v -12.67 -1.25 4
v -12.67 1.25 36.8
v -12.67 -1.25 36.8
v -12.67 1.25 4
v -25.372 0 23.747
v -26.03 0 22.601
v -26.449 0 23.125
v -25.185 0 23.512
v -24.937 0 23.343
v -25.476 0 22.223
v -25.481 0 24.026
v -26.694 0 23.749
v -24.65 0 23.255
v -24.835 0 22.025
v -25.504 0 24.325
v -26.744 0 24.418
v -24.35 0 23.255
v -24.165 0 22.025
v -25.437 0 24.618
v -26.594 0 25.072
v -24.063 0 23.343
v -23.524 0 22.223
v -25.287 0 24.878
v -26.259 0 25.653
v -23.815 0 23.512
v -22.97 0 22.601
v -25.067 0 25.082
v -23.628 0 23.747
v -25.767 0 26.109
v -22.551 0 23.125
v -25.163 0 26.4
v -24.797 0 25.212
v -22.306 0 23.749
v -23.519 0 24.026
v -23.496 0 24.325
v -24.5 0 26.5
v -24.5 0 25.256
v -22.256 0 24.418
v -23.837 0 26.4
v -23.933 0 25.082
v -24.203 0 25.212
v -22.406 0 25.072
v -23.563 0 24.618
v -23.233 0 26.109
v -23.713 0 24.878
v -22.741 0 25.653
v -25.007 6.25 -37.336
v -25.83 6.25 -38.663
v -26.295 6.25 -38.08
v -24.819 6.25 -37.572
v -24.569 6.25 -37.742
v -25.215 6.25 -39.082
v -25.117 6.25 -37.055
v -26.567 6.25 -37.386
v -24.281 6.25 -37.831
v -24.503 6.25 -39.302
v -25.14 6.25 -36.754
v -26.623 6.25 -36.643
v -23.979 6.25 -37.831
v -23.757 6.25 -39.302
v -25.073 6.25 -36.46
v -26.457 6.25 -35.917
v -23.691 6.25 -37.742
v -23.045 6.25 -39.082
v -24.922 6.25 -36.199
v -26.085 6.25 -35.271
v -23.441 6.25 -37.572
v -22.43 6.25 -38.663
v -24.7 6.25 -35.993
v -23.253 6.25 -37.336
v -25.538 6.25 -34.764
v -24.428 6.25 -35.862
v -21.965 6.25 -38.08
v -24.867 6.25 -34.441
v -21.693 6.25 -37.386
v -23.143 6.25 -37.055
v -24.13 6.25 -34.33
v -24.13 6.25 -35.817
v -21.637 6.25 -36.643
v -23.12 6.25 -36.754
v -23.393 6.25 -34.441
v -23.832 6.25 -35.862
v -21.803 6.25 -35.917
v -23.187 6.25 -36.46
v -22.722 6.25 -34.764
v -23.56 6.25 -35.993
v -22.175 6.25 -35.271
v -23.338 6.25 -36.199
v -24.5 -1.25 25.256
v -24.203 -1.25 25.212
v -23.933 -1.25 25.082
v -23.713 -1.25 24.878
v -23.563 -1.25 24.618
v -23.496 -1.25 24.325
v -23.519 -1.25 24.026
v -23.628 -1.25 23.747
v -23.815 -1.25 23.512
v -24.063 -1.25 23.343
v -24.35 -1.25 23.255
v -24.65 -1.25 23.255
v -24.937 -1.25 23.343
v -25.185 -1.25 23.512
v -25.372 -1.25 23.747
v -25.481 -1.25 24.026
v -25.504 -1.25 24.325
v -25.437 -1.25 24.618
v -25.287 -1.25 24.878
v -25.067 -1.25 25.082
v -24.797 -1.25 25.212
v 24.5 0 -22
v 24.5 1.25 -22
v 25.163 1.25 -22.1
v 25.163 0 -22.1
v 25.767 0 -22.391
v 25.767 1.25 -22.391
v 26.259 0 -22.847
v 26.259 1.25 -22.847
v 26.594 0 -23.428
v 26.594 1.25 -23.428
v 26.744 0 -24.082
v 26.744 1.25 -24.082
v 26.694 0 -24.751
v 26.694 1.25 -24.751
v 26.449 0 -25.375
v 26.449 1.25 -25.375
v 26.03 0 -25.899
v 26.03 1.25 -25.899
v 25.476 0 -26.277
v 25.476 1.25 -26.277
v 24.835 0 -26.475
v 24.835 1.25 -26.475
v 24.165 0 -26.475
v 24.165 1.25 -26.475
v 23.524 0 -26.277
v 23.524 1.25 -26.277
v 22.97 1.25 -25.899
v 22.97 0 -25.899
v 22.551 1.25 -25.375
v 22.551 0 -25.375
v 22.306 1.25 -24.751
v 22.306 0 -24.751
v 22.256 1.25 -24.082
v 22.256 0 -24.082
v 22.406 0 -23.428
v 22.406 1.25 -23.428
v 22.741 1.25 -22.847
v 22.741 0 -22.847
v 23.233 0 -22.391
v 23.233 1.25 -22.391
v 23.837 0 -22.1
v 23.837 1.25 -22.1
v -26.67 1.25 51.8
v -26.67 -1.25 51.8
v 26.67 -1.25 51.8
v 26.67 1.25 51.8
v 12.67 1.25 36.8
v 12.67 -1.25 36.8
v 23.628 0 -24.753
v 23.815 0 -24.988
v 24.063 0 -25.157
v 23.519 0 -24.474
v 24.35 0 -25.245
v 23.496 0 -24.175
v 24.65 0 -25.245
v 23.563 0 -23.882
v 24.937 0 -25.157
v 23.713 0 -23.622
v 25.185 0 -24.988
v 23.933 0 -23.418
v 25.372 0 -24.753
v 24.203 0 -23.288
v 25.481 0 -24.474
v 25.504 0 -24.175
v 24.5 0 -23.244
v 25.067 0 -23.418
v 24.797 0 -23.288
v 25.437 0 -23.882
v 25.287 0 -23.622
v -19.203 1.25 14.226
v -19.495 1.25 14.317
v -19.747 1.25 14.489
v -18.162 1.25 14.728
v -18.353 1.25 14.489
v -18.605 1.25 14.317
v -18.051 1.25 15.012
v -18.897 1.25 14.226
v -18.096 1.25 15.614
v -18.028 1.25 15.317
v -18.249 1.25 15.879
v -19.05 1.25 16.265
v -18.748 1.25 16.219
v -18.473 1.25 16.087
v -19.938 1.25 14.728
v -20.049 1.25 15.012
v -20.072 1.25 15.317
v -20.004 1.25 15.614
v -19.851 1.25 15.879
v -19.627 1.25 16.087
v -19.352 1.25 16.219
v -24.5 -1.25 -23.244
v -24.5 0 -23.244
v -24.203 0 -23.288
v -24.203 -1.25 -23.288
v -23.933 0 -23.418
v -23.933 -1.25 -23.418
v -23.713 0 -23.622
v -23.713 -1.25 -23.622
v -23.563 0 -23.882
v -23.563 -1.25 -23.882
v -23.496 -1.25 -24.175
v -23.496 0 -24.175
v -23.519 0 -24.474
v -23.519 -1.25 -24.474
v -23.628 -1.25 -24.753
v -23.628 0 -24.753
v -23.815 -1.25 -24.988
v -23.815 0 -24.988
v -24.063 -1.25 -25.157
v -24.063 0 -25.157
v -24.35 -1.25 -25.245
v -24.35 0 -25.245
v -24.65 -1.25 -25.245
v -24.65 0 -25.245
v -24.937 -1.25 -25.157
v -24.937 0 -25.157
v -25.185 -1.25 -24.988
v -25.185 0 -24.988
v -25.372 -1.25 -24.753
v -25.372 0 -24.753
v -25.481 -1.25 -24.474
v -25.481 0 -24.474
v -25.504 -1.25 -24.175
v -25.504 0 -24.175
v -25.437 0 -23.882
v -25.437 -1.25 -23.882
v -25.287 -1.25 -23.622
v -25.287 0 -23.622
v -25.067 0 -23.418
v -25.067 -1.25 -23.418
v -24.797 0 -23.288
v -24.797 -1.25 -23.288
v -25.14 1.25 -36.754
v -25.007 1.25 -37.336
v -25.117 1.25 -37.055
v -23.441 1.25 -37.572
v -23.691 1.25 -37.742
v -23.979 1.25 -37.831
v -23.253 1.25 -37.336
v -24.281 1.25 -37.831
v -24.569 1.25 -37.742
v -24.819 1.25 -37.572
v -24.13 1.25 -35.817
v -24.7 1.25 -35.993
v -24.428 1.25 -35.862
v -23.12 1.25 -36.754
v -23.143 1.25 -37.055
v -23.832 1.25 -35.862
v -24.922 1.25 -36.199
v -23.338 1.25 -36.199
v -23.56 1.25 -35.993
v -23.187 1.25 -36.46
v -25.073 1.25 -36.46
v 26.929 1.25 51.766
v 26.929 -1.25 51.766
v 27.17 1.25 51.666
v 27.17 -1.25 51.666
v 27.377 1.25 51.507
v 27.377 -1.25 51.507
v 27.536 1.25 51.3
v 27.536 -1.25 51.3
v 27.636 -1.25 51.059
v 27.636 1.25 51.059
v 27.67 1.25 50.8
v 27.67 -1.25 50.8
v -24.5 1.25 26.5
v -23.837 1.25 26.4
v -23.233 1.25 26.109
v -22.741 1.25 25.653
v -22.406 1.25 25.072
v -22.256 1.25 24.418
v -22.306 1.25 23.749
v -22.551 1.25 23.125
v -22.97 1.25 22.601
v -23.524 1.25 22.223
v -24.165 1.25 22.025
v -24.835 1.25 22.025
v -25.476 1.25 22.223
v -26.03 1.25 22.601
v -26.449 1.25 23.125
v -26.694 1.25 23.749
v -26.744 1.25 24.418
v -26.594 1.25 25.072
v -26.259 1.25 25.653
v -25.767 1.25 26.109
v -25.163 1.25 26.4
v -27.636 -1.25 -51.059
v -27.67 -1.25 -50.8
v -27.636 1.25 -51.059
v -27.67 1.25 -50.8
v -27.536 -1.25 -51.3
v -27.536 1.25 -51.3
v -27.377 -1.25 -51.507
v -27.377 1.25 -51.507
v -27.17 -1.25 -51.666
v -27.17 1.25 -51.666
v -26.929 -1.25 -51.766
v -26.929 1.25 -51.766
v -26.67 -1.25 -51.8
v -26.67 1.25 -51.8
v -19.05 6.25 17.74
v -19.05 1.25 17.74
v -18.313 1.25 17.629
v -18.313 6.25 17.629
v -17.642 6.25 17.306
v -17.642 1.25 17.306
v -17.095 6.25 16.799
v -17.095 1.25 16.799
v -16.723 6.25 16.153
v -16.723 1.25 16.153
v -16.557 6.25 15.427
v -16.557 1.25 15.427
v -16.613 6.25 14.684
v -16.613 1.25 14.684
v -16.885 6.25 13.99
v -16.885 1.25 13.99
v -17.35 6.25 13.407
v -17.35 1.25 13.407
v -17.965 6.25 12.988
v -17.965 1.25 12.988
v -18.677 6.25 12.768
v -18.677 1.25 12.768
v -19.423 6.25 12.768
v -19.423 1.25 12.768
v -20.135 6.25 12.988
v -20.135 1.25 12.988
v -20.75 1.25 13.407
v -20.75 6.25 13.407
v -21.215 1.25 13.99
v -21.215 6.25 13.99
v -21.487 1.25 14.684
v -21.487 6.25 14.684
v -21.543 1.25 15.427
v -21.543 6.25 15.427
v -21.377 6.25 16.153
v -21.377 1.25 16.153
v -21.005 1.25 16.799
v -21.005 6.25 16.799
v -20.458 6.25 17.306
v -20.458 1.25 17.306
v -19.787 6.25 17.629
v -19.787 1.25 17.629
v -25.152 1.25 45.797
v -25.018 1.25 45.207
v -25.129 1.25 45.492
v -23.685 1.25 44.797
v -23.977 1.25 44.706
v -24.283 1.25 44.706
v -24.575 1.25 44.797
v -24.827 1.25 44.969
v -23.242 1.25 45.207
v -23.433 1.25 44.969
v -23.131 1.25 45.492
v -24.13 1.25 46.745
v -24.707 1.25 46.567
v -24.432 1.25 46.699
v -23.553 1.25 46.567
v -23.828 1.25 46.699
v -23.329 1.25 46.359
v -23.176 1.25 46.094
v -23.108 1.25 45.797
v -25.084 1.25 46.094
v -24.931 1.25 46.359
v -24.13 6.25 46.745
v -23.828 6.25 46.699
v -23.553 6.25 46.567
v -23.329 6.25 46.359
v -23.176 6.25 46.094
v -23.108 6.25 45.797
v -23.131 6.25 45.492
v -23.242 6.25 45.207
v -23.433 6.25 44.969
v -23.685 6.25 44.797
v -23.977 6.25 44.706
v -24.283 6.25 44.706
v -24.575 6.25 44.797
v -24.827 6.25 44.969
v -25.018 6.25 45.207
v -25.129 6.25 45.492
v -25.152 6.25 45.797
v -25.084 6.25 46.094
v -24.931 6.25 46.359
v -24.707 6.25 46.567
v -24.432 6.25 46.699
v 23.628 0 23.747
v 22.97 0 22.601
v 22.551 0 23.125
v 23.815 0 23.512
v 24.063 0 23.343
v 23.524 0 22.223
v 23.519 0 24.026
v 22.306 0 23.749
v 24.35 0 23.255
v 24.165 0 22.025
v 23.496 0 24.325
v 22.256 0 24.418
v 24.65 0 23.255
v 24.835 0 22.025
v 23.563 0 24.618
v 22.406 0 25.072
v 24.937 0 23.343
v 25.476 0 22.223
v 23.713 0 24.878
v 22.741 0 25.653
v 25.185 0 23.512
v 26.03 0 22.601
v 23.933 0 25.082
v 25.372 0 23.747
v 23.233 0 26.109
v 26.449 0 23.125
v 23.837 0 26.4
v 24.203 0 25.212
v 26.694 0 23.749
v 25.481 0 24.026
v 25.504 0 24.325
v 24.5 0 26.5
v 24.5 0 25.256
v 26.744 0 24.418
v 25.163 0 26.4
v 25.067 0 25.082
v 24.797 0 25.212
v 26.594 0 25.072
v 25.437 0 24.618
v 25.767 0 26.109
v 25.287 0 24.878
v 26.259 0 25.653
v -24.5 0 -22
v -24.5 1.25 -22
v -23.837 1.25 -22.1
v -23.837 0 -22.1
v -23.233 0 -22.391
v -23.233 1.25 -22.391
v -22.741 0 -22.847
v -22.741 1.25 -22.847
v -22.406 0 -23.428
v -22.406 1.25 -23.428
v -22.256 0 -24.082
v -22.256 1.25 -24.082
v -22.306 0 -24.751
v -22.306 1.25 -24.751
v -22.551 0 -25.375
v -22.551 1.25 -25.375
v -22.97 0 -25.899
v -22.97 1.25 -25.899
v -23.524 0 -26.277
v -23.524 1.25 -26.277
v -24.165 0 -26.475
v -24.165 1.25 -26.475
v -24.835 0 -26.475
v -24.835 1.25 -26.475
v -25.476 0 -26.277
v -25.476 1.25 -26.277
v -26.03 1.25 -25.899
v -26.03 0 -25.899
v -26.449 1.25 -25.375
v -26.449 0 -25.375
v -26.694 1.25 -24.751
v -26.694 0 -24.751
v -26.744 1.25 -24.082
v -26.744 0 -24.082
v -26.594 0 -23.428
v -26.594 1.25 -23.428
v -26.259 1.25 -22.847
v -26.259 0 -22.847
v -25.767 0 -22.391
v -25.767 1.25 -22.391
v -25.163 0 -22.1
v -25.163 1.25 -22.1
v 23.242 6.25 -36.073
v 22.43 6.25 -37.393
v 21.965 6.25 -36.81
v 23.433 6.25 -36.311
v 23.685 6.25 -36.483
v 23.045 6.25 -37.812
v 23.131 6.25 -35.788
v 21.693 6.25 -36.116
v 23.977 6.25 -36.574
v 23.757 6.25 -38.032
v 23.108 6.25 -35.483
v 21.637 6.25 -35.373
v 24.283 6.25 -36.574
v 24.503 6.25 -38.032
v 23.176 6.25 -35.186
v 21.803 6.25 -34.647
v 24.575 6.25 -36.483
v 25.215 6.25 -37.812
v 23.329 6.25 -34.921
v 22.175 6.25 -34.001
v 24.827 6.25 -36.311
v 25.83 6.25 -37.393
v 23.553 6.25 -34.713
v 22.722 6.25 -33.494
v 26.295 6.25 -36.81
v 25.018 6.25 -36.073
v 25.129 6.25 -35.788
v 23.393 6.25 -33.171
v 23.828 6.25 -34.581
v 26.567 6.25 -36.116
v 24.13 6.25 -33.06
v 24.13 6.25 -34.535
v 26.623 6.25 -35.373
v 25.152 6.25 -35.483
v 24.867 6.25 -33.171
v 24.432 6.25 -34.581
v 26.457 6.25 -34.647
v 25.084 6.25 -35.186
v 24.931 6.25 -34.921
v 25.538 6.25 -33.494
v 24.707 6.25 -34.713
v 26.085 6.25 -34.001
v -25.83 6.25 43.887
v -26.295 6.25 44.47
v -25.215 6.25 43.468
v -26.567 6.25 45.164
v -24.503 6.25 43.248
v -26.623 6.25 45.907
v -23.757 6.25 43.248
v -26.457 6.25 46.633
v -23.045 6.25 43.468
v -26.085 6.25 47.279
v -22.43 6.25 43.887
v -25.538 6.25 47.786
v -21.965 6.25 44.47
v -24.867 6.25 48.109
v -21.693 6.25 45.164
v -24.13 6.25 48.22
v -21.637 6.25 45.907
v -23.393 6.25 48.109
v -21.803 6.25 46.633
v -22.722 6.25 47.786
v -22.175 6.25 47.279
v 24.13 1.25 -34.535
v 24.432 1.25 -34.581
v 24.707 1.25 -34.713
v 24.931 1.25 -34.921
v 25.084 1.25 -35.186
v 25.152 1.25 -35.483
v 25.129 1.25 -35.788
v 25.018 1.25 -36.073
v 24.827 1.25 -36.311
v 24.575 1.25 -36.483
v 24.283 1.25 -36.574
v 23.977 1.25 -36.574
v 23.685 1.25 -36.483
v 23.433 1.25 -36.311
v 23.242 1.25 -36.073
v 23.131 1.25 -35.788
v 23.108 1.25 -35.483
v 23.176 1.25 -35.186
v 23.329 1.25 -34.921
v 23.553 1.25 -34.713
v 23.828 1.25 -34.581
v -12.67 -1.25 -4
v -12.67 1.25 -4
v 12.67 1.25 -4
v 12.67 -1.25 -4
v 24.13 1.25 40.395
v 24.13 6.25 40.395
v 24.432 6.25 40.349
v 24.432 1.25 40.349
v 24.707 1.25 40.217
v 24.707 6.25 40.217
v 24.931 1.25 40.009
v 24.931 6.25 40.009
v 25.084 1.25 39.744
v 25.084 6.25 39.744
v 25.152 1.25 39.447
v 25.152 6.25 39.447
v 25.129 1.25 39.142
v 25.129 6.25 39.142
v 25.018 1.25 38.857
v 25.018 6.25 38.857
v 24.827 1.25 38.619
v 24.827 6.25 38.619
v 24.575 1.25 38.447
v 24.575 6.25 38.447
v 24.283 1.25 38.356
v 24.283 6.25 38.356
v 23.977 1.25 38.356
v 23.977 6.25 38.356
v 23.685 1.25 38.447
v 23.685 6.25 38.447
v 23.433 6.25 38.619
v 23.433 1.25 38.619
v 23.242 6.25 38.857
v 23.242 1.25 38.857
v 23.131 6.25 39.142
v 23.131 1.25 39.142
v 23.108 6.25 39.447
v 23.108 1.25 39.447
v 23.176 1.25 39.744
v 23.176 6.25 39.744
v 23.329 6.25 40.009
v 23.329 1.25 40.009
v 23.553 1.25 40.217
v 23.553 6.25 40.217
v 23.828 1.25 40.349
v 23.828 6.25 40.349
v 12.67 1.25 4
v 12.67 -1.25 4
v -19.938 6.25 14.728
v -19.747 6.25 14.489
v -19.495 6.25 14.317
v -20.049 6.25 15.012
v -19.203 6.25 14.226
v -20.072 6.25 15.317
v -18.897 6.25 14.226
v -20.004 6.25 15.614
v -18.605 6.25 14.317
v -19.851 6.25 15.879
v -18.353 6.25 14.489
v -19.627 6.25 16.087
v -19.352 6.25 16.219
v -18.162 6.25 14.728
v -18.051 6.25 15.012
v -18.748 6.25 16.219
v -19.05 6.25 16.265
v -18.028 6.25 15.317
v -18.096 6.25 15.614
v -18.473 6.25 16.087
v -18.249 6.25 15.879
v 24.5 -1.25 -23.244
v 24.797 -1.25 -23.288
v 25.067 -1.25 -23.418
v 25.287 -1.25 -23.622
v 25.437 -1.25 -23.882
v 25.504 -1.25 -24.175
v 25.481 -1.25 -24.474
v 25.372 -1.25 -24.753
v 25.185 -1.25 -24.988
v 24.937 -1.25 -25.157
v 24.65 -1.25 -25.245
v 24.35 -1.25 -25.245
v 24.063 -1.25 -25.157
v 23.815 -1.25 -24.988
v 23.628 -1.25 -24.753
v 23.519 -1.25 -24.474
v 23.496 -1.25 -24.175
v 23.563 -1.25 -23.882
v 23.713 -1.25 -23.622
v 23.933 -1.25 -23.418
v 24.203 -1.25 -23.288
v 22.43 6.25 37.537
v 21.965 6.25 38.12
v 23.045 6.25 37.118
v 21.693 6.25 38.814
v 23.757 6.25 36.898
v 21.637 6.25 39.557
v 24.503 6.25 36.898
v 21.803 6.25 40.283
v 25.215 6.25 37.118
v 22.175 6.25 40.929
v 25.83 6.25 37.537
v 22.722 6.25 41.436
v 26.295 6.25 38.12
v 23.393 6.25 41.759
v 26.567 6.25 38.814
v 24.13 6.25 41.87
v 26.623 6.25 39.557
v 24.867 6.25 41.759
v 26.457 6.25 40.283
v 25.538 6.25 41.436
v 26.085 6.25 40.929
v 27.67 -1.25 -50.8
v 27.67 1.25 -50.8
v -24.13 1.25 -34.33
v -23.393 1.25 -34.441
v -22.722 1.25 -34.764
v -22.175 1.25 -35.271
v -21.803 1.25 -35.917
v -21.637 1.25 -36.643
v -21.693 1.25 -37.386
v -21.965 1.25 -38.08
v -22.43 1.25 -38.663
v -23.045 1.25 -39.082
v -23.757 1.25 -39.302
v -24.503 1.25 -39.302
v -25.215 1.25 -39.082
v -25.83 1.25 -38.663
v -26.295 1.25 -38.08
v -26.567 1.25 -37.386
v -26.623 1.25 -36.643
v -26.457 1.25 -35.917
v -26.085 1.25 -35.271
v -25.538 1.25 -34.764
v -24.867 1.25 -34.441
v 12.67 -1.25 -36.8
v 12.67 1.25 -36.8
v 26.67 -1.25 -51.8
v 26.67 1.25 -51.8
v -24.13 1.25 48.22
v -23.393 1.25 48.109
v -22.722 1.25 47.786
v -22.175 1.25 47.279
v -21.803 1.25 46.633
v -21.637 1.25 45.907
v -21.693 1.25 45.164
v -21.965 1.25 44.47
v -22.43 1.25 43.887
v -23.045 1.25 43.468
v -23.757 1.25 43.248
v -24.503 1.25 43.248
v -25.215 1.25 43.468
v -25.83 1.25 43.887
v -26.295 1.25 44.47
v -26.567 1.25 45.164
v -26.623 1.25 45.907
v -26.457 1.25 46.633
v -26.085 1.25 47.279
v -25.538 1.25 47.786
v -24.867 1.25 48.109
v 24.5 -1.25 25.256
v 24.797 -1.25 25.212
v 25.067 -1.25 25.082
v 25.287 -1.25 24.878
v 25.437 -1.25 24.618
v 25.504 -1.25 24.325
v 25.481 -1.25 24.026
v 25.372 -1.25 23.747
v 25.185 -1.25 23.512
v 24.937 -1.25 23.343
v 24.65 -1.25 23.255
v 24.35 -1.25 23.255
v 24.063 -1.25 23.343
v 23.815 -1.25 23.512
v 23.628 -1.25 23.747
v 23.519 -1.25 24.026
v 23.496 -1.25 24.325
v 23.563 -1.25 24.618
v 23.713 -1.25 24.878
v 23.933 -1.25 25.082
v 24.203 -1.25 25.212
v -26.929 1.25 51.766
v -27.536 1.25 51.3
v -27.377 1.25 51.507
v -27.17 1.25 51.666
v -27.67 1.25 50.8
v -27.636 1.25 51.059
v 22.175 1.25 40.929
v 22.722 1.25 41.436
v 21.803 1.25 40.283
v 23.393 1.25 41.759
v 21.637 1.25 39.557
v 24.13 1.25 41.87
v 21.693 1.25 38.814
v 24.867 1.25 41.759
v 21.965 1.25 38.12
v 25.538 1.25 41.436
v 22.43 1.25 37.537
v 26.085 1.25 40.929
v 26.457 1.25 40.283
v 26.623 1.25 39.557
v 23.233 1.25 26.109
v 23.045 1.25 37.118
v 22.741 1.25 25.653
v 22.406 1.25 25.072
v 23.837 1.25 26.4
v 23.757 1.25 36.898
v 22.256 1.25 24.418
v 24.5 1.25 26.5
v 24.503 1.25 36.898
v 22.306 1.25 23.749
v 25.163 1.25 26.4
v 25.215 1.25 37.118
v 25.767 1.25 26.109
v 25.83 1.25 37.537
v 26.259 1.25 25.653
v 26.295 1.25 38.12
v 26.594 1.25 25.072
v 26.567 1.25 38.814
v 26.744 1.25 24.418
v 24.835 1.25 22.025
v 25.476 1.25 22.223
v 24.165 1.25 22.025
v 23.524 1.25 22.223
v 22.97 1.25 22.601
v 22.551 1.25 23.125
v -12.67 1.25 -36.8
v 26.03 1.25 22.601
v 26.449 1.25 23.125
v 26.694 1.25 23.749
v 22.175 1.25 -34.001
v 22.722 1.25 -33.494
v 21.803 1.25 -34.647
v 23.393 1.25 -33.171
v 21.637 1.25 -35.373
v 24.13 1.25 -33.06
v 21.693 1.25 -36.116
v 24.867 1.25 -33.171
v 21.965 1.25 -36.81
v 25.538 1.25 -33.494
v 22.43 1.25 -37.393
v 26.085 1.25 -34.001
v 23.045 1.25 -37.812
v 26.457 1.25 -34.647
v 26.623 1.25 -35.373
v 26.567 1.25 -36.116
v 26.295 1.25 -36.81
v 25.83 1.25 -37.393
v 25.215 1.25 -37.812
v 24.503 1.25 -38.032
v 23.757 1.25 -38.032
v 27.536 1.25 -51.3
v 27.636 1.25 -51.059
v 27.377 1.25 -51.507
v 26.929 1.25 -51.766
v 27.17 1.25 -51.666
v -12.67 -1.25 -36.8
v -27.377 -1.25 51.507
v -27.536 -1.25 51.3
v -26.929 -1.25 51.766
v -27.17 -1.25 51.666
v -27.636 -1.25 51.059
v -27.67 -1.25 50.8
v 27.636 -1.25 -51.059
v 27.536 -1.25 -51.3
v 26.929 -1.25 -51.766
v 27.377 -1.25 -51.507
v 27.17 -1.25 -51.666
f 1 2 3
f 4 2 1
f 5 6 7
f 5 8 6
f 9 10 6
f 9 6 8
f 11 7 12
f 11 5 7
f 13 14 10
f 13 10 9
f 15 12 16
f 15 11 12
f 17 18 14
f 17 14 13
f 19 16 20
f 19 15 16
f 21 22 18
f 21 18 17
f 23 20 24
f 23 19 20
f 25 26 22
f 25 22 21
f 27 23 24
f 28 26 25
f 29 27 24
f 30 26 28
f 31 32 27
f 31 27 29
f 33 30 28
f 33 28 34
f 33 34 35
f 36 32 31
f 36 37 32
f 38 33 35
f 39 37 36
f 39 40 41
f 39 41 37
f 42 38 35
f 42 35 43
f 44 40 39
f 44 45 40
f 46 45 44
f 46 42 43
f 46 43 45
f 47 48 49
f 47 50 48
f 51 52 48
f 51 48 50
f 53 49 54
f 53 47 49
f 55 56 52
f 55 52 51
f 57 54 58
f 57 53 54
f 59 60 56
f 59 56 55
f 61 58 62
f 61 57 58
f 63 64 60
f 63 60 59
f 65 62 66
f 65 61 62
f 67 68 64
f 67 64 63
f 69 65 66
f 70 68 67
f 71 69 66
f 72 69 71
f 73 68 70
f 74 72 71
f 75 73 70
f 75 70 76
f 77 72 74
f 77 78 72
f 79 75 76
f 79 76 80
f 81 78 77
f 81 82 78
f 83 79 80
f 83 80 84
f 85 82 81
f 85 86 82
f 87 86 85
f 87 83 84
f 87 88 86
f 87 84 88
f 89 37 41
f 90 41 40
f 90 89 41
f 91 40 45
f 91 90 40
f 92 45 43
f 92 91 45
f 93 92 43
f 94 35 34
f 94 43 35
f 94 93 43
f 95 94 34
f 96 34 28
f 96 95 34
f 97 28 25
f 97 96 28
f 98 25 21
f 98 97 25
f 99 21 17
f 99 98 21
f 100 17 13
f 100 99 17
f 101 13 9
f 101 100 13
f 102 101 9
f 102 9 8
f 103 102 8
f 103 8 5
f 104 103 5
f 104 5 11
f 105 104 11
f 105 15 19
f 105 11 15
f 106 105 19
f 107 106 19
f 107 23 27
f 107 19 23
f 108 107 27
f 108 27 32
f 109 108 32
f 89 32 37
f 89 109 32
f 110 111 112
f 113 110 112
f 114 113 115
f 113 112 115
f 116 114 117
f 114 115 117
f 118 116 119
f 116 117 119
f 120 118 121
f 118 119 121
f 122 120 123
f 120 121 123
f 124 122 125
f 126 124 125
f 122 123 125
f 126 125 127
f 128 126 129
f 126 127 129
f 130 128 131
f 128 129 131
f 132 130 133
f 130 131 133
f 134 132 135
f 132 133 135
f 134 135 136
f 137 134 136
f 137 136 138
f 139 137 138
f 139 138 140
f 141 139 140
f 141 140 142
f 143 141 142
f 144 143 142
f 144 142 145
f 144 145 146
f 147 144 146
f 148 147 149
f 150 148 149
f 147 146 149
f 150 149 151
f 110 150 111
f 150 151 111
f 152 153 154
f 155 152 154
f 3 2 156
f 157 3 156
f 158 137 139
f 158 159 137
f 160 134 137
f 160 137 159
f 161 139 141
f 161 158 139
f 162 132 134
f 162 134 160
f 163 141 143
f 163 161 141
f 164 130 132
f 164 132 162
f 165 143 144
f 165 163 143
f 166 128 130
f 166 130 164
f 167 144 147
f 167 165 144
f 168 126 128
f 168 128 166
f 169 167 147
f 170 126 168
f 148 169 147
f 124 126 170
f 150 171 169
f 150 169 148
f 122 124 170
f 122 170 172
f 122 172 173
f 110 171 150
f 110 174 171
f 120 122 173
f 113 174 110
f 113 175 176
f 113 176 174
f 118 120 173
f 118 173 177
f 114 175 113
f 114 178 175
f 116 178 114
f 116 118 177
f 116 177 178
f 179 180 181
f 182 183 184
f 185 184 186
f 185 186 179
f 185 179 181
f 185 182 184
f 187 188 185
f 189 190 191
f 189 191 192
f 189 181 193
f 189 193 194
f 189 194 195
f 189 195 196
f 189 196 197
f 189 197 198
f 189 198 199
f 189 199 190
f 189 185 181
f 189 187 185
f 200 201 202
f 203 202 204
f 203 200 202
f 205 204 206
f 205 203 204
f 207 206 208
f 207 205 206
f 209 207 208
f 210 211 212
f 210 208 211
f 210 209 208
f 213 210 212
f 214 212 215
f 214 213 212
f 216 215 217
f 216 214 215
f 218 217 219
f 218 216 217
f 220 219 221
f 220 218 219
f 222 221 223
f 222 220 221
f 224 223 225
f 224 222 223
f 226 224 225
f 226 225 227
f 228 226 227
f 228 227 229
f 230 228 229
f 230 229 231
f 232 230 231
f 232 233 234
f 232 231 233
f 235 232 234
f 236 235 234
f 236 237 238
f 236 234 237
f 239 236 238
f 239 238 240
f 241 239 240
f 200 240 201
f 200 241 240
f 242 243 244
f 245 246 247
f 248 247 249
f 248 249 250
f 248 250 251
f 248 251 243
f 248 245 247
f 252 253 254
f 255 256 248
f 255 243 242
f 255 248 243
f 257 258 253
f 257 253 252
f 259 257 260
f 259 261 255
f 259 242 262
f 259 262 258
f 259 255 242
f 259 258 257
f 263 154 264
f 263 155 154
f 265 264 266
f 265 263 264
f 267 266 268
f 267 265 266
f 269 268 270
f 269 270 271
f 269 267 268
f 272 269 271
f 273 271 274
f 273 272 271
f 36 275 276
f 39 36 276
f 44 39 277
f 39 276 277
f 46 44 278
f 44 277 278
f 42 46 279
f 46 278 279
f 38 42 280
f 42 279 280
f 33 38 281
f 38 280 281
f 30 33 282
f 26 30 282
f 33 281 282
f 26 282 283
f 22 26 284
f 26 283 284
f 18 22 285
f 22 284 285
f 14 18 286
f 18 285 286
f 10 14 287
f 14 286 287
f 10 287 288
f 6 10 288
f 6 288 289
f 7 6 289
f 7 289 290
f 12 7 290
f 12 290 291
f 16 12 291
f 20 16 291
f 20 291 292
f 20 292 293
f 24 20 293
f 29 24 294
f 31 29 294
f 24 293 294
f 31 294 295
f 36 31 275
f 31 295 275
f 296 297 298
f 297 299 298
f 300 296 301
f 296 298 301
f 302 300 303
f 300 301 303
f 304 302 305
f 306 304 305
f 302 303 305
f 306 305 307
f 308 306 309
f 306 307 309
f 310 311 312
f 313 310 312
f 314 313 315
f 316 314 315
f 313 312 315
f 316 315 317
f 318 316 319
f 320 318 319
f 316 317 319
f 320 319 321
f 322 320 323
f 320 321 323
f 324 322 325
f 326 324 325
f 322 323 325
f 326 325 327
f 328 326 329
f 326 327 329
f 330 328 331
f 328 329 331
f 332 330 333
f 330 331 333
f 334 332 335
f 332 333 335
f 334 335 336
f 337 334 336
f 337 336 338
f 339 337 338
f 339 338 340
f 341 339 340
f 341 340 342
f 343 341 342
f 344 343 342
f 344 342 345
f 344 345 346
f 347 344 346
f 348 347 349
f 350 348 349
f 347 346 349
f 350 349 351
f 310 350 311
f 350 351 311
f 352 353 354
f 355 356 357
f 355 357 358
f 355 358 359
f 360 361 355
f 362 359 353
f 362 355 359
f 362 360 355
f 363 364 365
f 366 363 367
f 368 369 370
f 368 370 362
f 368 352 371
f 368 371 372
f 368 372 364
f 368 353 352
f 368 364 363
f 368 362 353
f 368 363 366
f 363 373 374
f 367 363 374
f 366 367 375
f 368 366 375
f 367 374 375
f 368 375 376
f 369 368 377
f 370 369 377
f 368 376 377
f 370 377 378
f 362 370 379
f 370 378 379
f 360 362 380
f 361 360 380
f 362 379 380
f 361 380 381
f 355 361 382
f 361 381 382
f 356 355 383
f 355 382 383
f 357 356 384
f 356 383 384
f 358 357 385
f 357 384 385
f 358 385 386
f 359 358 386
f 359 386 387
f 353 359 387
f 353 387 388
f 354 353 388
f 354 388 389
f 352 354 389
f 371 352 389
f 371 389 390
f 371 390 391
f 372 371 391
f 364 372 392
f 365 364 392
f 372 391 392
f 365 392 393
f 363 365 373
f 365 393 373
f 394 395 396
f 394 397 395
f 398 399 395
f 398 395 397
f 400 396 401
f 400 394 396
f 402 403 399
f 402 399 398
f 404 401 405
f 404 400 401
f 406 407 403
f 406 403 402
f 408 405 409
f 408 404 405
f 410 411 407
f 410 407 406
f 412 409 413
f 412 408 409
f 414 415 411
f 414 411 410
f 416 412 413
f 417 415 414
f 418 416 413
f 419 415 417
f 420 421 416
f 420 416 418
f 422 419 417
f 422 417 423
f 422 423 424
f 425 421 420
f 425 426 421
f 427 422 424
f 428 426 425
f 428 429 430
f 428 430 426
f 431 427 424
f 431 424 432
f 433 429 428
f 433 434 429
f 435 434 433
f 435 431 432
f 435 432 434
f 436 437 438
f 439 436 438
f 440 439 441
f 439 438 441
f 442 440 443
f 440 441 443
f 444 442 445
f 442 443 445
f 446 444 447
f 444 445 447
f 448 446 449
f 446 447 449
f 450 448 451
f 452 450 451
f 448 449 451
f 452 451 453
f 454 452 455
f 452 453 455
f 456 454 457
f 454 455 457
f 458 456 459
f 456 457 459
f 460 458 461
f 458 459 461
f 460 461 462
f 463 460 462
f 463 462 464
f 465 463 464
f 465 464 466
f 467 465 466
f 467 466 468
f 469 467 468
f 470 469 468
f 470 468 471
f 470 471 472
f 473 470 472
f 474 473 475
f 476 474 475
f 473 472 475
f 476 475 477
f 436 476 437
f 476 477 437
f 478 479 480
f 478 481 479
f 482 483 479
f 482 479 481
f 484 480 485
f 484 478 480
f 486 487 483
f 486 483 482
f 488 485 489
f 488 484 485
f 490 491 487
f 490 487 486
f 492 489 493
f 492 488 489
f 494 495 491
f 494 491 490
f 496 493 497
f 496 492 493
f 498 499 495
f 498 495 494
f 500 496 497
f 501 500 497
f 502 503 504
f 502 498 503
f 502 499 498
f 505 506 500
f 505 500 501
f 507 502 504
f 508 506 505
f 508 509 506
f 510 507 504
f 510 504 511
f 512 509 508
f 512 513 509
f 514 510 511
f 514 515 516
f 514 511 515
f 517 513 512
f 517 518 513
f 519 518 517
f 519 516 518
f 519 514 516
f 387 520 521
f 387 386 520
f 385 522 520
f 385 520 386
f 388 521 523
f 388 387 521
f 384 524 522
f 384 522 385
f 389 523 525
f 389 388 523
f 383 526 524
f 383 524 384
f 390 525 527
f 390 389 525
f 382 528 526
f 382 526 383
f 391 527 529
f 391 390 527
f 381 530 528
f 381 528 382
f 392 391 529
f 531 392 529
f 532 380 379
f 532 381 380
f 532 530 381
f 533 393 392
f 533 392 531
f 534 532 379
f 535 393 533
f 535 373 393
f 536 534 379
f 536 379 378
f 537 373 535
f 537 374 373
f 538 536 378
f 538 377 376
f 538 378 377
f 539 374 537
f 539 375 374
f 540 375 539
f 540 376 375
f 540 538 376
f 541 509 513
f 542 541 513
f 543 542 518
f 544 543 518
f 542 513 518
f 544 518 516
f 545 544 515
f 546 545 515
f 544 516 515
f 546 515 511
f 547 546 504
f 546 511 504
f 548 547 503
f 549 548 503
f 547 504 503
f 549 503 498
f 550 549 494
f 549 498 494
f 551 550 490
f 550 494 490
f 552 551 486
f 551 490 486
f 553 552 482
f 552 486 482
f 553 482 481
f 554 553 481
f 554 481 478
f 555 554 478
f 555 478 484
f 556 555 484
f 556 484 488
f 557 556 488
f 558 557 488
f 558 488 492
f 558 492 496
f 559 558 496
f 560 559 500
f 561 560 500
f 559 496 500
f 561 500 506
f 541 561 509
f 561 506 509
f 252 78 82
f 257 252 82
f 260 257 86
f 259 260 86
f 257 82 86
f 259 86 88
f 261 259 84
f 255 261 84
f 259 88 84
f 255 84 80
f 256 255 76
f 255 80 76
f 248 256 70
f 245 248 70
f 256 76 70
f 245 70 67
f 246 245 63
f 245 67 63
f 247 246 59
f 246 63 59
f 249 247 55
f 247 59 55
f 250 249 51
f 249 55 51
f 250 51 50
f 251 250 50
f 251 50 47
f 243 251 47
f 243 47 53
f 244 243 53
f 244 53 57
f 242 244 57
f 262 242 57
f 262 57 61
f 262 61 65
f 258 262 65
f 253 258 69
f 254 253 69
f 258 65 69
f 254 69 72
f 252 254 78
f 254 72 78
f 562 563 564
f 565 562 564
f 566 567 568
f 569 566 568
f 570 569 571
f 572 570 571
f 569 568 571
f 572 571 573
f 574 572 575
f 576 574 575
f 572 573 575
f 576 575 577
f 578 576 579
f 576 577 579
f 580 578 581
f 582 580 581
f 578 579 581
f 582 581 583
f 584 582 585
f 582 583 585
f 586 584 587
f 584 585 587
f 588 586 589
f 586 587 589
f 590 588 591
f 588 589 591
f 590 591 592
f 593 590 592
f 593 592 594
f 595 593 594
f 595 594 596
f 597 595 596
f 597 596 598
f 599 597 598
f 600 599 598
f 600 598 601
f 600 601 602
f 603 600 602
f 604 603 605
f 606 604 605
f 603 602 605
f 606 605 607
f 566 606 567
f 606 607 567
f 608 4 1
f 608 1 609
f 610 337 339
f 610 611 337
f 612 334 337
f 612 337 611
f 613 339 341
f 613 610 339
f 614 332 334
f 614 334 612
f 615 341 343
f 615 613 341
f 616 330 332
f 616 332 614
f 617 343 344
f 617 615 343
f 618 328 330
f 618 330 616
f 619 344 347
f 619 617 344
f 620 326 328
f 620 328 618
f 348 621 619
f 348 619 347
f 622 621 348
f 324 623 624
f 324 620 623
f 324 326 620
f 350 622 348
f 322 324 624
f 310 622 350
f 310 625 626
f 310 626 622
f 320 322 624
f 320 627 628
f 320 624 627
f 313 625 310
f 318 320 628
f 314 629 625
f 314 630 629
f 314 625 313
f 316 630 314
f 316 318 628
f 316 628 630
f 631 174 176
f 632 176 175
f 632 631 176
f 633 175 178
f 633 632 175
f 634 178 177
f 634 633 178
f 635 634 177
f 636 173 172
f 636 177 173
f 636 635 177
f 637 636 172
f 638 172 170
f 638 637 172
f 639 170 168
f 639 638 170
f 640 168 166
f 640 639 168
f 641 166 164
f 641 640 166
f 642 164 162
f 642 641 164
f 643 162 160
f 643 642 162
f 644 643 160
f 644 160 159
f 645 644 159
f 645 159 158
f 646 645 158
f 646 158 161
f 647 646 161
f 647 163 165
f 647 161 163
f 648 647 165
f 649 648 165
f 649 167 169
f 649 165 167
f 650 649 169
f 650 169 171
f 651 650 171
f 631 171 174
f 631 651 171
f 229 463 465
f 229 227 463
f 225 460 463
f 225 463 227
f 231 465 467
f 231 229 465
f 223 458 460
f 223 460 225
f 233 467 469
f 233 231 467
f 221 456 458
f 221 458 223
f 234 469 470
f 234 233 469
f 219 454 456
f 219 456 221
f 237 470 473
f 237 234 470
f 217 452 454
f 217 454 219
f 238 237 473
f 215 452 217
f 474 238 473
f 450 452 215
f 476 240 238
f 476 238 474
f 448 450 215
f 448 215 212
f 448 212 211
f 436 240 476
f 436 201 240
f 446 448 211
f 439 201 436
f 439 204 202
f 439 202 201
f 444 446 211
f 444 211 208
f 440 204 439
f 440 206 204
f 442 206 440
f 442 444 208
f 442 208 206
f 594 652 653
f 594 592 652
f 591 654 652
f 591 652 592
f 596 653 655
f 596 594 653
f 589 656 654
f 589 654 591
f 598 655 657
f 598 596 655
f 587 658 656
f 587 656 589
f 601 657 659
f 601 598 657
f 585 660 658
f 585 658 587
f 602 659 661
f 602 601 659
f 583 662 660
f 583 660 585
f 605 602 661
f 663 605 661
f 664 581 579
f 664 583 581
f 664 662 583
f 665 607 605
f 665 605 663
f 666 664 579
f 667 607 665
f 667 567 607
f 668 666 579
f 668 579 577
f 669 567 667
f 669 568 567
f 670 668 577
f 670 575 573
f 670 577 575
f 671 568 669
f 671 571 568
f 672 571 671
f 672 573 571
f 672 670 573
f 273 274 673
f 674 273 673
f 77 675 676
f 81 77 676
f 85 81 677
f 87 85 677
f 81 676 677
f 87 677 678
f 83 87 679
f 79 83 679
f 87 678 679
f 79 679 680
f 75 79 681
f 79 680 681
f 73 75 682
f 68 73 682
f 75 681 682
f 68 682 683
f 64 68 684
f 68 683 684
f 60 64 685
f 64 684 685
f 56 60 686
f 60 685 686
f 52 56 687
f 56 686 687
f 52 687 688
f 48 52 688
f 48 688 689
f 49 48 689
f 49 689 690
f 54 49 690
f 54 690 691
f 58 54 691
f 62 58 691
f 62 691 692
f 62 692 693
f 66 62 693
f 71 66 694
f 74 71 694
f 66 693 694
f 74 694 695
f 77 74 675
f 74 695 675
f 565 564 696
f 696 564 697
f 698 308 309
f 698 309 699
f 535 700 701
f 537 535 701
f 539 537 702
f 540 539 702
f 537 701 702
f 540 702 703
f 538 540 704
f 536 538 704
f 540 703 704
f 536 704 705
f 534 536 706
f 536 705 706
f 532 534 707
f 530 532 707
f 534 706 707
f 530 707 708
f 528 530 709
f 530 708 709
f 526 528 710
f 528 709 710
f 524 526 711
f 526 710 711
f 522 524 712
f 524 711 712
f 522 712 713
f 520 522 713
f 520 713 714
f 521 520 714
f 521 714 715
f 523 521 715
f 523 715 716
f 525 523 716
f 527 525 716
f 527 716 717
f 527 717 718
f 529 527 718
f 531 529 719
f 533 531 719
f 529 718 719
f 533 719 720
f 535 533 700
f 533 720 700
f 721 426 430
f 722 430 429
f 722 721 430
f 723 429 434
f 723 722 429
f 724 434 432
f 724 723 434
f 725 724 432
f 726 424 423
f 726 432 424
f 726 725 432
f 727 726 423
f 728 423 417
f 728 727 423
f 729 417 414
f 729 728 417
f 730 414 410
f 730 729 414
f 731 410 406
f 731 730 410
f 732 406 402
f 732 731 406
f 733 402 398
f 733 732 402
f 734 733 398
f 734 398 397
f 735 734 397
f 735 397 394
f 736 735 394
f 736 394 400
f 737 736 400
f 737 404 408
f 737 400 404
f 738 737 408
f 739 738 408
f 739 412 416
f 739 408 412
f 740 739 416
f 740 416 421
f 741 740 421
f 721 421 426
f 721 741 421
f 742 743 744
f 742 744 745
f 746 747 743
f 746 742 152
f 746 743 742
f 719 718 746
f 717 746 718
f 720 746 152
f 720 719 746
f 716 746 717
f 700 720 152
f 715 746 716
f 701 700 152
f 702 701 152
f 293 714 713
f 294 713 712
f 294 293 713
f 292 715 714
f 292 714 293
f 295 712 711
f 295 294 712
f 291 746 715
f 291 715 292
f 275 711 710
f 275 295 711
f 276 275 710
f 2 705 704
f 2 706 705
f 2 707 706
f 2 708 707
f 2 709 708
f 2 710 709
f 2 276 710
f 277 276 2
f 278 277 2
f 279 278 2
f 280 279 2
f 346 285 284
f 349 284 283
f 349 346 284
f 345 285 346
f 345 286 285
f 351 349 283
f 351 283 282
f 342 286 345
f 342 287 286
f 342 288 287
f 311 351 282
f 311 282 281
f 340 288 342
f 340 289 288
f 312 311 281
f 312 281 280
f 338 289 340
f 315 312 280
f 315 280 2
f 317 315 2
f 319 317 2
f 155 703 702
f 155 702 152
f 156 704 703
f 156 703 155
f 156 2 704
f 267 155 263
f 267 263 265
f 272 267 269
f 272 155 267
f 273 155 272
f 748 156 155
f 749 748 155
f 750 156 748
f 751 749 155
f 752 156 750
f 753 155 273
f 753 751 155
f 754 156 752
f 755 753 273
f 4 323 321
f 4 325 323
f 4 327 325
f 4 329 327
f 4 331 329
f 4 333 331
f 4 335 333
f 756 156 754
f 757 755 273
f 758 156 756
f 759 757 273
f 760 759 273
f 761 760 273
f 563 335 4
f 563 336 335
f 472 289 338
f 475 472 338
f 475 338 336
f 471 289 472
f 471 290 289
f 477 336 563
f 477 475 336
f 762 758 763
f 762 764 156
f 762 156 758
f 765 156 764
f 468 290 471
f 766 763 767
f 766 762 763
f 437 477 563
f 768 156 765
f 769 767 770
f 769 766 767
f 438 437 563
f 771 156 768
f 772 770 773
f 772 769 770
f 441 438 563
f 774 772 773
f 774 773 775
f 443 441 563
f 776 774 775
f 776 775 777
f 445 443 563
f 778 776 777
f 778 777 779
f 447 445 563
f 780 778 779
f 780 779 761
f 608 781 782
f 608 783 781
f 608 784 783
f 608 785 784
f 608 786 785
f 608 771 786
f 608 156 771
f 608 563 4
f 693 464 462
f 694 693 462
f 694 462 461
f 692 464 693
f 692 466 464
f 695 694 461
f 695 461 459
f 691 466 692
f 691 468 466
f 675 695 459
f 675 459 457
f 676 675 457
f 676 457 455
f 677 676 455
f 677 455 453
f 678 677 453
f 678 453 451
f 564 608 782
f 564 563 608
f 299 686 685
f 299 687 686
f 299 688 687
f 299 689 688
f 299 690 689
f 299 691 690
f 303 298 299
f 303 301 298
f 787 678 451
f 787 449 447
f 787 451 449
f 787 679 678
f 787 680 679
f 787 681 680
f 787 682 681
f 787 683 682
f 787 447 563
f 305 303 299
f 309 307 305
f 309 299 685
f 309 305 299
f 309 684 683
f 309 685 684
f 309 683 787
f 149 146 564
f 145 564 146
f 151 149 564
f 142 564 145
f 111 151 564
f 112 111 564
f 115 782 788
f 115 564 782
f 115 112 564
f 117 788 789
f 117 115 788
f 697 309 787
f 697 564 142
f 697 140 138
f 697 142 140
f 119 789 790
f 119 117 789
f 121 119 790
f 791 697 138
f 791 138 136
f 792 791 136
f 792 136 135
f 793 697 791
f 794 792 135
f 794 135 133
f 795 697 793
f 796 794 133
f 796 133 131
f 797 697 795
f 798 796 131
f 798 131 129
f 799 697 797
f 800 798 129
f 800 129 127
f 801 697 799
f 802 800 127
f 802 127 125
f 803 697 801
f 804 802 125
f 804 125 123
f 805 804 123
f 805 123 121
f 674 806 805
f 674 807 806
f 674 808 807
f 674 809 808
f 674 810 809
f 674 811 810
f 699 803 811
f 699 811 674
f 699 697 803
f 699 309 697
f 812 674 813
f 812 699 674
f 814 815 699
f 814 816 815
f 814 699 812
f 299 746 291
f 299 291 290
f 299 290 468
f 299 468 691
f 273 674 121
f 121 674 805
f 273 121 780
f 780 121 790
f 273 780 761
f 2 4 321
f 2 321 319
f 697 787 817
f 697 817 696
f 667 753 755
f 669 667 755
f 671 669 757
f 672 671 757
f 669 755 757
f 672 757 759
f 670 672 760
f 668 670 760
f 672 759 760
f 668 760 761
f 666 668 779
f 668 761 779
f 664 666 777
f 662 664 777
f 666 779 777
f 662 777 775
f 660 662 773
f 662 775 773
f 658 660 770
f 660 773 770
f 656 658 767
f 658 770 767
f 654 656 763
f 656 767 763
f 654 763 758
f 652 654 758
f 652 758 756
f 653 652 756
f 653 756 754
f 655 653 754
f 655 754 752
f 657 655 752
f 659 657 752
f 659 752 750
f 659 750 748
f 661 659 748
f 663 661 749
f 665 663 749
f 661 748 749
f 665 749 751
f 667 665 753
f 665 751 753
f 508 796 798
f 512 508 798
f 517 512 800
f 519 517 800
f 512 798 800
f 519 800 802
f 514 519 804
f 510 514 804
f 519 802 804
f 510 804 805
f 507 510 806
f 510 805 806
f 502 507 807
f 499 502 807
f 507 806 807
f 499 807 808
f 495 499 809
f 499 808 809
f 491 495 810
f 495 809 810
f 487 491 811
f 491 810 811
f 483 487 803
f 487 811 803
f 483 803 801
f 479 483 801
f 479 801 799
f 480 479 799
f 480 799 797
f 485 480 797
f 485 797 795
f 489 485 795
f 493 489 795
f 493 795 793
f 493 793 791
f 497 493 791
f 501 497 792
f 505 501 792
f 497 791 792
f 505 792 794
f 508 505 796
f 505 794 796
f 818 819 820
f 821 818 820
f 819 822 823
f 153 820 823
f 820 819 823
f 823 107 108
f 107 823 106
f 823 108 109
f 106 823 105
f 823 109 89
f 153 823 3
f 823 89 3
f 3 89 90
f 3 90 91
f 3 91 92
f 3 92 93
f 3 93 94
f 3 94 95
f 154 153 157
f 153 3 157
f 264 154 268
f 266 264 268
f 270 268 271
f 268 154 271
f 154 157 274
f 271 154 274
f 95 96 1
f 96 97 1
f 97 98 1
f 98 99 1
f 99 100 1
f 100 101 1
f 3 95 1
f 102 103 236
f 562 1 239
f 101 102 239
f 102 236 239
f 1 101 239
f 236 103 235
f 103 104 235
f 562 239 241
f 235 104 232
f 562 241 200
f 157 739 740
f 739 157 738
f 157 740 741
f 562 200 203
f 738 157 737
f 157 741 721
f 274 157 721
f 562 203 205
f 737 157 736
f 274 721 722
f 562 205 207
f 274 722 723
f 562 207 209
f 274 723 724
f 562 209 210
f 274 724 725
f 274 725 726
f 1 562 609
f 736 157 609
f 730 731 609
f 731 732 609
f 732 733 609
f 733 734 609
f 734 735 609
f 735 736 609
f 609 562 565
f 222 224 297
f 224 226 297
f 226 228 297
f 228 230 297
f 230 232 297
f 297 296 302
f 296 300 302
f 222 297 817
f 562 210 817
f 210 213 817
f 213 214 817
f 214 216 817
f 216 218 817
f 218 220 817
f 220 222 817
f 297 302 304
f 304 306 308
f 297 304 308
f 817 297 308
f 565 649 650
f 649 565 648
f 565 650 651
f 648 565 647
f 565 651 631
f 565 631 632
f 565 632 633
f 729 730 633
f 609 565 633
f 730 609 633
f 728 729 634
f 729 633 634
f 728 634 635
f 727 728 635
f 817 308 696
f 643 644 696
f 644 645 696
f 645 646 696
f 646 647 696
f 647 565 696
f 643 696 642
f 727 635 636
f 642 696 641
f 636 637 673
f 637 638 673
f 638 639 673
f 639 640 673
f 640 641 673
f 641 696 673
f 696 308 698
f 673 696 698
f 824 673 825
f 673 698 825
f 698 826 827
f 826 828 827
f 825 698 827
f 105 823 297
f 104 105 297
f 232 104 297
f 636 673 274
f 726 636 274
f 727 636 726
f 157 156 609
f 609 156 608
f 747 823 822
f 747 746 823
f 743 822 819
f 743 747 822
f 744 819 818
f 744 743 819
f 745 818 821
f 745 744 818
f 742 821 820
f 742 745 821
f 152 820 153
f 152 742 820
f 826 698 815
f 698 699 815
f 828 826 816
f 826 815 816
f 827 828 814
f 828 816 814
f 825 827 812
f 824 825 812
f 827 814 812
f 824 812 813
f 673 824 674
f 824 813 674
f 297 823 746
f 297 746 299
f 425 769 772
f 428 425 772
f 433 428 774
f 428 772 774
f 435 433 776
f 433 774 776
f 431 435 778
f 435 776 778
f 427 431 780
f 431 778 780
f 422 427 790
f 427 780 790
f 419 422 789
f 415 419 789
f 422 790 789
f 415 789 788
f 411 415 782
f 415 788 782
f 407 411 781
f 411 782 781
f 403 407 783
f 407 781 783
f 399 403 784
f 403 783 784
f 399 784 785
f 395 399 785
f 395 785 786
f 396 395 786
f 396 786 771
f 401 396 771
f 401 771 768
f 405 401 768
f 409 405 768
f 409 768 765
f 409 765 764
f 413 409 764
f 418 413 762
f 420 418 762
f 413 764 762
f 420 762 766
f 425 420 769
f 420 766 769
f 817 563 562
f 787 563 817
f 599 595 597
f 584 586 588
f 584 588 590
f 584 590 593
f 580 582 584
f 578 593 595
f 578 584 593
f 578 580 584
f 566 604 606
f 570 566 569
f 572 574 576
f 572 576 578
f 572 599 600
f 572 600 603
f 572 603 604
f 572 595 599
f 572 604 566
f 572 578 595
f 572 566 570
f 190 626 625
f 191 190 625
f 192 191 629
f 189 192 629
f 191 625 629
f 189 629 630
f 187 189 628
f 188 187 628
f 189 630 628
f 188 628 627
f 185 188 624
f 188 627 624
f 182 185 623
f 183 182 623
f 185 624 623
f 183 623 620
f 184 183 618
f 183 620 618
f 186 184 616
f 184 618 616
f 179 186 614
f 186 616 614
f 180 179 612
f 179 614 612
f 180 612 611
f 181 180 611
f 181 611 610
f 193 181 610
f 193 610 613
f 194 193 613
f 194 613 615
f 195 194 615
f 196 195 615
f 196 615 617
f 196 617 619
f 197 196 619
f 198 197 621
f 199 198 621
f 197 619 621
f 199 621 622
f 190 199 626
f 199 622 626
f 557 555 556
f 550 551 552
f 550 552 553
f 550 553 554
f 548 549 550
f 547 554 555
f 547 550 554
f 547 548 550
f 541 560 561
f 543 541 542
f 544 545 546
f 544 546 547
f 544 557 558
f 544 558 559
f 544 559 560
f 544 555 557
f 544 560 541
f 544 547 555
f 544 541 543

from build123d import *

# Parameters (mm, degrees)
BOSS_EXTRU_1_DEPTH      = 1.25
BOSS_EXTRU_1_DEPTH_BACK = 1.25
ESQUISSE1_W             = 55.34
ESQUISSE1_H             = 103.6
ESQUISSE1_R             = 1.0065
ESQUISSE2_R             = 2.25
ENL_V_MAT_EXTRU_1_DEPTH = 1.25
ESQUISSE4_R             = 2.5
BOSS_EXTRU_3_DEPTH      = 5
ESQUISSE7_R             = 1.025
ESQUISSE7_R_2           = 1.0125
ENL_V_MAT_EXTRU_2_DEPTH = 5
ESQUISSE8_W             = 25.34
ESQUISSE8_H             = 73.6
ENL_V_MAT_EXTRU_3_DEPTH = 59.939535967
ESQUISSE16_W            = 25.34
ESQUISSE16_H            = 8
BOSS_EXTRU_6_DEPTH      = 2.5
CONG_8_R                = 1


with BuildPart() as part:
    # Esquisse1 → Boss.-Extru.1 (new, two sides: drawn at the far end of the back side and taken through both)
    with BuildSketch(Plane(origin=(0, 0, 0), x_dir=(1, 0, 0), z_dir=(0, 1, 0)).offset(-BOSS_EXTRU_1_DEPTH_BACK)):
        Rectangle(ESQUISSE1_W, ESQUISSE1_H)
        with Locations((24.5, -24.25)):
            Circle(ESQUISSE1_R, mode=Mode.SUBTRACT)
        with Locations((-24.5, -24.25)):
            Circle(ESQUISSE1_R, mode=Mode.SUBTRACT)
        with Locations((24.5, 24.25)):
            Circle(ESQUISSE1_R, mode=Mode.SUBTRACT)
        with Locations((-24.5, 24.25)):
            Circle(ESQUISSE1_R, mode=Mode.SUBTRACT)
    extrude(amount=BOSS_EXTRU_1_DEPTH + BOSS_EXTRU_1_DEPTH_BACK)

    # Esquisse2 → Enlèv. mat.-Extru.1 (cut)
    with BuildSketch(Plane(origin=(0, 1.25, 0), x_dir=(1, 0, 0), z_dir=(0, 1, 0))):
        with Locations((-24.5, 24.25)):
            Circle(ESQUISSE2_R)
        with Locations((24.5, 24.25)):
            Circle(ESQUISSE2_R)
        with Locations((24.5, -24.25)):
            Circle(ESQUISSE2_R)
        with Locations((-24.5, -24.25)):
            Circle(ESQUISSE2_R)
    extrude(amount=-ENL_V_MAT_EXTRU_1_DEPTH, mode=Mode.SUBTRACT)

    # Esquisse4 → Boss.-Extru.3 (add)
    with BuildSketch(Plane(origin=(0, 1.25, 0), x_dir=(1, 0, 0), z_dir=(0, 1, 0))):
        with Locations((-19.05, -15.24)):
            Circle(ESQUISSE4_R)
        with Locations((-24.13, -45.72)):
            Circle(ESQUISSE4_R)
        with Locations((24.13, -39.37)):
            Circle(ESQUISSE4_R)
        with Locations((24.13, 35.56)):
            Circle(ESQUISSE4_R)
        with Locations((-24.13, 36.83)):
            Circle(ESQUISSE4_R)
    extrude(amount=BOSS_EXTRU_3_DEPTH)

    # Esquisse7 → Enlèv. mat.-Extru.2 (cut)
    with BuildSketch(Plane(origin=(0, 6.25, 0), x_dir=(1, 0, 0), z_dir=(0, 1, 0))):
        with Locations((-24.13, -45.72)):
            Circle(ESQUISSE7_R)
        with Locations((-24.13, 36.83)):
            Circle(ESQUISSE7_R_2)
        with Locations((24.13, -39.37)):
            Circle(ESQUISSE7_R)
        with Locations((24.13, 35.56)):
            Circle(ESQUISSE7_R)
        with Locations((-19.05, -15.24)):
            Circle(ESQUISSE7_R)
    extrude(amount=-ENL_V_MAT_EXTRU_2_DEPTH, mode=Mode.SUBTRACT)

    # Esquisse8 → Enlèv. mat.-Extru.3 (cut, through all)
    with BuildSketch(Plane(origin=(0, 1.25, 0), x_dir=(1, 0, 0), z_dir=(0, 1, 0))):
        Rectangle(ESQUISSE8_W, ESQUISSE8_H)
    extrude(amount=-ENL_V_MAT_EXTRU_3_DEPTH, mode=Mode.SUBTRACT)

    # Esquisse16 → Boss.-Extru.6 (add)
    with BuildSketch(Plane(origin=(0, 1.25, 0), x_dir=(1, 0, 0), z_dir=(0, 1, 0))):
        Rectangle(ESQUISSE16_W, ESQUISSE16_H)
    extrude(amount=-BOSS_EXTRU_6_DEPTH)

    # Congé8
    cong_8_edges = [part.edges().sort_by_distance(p)[0] for p in [
        (27.67, 0, 51.8),
        (-27.67, 0, 51.8),
        (-27.67, 0, -51.8),
        (27.67, 0, -51.8),
    ]]
    fillet(cong_8_edges, radius=CONG_8_R)


solid = part.part
